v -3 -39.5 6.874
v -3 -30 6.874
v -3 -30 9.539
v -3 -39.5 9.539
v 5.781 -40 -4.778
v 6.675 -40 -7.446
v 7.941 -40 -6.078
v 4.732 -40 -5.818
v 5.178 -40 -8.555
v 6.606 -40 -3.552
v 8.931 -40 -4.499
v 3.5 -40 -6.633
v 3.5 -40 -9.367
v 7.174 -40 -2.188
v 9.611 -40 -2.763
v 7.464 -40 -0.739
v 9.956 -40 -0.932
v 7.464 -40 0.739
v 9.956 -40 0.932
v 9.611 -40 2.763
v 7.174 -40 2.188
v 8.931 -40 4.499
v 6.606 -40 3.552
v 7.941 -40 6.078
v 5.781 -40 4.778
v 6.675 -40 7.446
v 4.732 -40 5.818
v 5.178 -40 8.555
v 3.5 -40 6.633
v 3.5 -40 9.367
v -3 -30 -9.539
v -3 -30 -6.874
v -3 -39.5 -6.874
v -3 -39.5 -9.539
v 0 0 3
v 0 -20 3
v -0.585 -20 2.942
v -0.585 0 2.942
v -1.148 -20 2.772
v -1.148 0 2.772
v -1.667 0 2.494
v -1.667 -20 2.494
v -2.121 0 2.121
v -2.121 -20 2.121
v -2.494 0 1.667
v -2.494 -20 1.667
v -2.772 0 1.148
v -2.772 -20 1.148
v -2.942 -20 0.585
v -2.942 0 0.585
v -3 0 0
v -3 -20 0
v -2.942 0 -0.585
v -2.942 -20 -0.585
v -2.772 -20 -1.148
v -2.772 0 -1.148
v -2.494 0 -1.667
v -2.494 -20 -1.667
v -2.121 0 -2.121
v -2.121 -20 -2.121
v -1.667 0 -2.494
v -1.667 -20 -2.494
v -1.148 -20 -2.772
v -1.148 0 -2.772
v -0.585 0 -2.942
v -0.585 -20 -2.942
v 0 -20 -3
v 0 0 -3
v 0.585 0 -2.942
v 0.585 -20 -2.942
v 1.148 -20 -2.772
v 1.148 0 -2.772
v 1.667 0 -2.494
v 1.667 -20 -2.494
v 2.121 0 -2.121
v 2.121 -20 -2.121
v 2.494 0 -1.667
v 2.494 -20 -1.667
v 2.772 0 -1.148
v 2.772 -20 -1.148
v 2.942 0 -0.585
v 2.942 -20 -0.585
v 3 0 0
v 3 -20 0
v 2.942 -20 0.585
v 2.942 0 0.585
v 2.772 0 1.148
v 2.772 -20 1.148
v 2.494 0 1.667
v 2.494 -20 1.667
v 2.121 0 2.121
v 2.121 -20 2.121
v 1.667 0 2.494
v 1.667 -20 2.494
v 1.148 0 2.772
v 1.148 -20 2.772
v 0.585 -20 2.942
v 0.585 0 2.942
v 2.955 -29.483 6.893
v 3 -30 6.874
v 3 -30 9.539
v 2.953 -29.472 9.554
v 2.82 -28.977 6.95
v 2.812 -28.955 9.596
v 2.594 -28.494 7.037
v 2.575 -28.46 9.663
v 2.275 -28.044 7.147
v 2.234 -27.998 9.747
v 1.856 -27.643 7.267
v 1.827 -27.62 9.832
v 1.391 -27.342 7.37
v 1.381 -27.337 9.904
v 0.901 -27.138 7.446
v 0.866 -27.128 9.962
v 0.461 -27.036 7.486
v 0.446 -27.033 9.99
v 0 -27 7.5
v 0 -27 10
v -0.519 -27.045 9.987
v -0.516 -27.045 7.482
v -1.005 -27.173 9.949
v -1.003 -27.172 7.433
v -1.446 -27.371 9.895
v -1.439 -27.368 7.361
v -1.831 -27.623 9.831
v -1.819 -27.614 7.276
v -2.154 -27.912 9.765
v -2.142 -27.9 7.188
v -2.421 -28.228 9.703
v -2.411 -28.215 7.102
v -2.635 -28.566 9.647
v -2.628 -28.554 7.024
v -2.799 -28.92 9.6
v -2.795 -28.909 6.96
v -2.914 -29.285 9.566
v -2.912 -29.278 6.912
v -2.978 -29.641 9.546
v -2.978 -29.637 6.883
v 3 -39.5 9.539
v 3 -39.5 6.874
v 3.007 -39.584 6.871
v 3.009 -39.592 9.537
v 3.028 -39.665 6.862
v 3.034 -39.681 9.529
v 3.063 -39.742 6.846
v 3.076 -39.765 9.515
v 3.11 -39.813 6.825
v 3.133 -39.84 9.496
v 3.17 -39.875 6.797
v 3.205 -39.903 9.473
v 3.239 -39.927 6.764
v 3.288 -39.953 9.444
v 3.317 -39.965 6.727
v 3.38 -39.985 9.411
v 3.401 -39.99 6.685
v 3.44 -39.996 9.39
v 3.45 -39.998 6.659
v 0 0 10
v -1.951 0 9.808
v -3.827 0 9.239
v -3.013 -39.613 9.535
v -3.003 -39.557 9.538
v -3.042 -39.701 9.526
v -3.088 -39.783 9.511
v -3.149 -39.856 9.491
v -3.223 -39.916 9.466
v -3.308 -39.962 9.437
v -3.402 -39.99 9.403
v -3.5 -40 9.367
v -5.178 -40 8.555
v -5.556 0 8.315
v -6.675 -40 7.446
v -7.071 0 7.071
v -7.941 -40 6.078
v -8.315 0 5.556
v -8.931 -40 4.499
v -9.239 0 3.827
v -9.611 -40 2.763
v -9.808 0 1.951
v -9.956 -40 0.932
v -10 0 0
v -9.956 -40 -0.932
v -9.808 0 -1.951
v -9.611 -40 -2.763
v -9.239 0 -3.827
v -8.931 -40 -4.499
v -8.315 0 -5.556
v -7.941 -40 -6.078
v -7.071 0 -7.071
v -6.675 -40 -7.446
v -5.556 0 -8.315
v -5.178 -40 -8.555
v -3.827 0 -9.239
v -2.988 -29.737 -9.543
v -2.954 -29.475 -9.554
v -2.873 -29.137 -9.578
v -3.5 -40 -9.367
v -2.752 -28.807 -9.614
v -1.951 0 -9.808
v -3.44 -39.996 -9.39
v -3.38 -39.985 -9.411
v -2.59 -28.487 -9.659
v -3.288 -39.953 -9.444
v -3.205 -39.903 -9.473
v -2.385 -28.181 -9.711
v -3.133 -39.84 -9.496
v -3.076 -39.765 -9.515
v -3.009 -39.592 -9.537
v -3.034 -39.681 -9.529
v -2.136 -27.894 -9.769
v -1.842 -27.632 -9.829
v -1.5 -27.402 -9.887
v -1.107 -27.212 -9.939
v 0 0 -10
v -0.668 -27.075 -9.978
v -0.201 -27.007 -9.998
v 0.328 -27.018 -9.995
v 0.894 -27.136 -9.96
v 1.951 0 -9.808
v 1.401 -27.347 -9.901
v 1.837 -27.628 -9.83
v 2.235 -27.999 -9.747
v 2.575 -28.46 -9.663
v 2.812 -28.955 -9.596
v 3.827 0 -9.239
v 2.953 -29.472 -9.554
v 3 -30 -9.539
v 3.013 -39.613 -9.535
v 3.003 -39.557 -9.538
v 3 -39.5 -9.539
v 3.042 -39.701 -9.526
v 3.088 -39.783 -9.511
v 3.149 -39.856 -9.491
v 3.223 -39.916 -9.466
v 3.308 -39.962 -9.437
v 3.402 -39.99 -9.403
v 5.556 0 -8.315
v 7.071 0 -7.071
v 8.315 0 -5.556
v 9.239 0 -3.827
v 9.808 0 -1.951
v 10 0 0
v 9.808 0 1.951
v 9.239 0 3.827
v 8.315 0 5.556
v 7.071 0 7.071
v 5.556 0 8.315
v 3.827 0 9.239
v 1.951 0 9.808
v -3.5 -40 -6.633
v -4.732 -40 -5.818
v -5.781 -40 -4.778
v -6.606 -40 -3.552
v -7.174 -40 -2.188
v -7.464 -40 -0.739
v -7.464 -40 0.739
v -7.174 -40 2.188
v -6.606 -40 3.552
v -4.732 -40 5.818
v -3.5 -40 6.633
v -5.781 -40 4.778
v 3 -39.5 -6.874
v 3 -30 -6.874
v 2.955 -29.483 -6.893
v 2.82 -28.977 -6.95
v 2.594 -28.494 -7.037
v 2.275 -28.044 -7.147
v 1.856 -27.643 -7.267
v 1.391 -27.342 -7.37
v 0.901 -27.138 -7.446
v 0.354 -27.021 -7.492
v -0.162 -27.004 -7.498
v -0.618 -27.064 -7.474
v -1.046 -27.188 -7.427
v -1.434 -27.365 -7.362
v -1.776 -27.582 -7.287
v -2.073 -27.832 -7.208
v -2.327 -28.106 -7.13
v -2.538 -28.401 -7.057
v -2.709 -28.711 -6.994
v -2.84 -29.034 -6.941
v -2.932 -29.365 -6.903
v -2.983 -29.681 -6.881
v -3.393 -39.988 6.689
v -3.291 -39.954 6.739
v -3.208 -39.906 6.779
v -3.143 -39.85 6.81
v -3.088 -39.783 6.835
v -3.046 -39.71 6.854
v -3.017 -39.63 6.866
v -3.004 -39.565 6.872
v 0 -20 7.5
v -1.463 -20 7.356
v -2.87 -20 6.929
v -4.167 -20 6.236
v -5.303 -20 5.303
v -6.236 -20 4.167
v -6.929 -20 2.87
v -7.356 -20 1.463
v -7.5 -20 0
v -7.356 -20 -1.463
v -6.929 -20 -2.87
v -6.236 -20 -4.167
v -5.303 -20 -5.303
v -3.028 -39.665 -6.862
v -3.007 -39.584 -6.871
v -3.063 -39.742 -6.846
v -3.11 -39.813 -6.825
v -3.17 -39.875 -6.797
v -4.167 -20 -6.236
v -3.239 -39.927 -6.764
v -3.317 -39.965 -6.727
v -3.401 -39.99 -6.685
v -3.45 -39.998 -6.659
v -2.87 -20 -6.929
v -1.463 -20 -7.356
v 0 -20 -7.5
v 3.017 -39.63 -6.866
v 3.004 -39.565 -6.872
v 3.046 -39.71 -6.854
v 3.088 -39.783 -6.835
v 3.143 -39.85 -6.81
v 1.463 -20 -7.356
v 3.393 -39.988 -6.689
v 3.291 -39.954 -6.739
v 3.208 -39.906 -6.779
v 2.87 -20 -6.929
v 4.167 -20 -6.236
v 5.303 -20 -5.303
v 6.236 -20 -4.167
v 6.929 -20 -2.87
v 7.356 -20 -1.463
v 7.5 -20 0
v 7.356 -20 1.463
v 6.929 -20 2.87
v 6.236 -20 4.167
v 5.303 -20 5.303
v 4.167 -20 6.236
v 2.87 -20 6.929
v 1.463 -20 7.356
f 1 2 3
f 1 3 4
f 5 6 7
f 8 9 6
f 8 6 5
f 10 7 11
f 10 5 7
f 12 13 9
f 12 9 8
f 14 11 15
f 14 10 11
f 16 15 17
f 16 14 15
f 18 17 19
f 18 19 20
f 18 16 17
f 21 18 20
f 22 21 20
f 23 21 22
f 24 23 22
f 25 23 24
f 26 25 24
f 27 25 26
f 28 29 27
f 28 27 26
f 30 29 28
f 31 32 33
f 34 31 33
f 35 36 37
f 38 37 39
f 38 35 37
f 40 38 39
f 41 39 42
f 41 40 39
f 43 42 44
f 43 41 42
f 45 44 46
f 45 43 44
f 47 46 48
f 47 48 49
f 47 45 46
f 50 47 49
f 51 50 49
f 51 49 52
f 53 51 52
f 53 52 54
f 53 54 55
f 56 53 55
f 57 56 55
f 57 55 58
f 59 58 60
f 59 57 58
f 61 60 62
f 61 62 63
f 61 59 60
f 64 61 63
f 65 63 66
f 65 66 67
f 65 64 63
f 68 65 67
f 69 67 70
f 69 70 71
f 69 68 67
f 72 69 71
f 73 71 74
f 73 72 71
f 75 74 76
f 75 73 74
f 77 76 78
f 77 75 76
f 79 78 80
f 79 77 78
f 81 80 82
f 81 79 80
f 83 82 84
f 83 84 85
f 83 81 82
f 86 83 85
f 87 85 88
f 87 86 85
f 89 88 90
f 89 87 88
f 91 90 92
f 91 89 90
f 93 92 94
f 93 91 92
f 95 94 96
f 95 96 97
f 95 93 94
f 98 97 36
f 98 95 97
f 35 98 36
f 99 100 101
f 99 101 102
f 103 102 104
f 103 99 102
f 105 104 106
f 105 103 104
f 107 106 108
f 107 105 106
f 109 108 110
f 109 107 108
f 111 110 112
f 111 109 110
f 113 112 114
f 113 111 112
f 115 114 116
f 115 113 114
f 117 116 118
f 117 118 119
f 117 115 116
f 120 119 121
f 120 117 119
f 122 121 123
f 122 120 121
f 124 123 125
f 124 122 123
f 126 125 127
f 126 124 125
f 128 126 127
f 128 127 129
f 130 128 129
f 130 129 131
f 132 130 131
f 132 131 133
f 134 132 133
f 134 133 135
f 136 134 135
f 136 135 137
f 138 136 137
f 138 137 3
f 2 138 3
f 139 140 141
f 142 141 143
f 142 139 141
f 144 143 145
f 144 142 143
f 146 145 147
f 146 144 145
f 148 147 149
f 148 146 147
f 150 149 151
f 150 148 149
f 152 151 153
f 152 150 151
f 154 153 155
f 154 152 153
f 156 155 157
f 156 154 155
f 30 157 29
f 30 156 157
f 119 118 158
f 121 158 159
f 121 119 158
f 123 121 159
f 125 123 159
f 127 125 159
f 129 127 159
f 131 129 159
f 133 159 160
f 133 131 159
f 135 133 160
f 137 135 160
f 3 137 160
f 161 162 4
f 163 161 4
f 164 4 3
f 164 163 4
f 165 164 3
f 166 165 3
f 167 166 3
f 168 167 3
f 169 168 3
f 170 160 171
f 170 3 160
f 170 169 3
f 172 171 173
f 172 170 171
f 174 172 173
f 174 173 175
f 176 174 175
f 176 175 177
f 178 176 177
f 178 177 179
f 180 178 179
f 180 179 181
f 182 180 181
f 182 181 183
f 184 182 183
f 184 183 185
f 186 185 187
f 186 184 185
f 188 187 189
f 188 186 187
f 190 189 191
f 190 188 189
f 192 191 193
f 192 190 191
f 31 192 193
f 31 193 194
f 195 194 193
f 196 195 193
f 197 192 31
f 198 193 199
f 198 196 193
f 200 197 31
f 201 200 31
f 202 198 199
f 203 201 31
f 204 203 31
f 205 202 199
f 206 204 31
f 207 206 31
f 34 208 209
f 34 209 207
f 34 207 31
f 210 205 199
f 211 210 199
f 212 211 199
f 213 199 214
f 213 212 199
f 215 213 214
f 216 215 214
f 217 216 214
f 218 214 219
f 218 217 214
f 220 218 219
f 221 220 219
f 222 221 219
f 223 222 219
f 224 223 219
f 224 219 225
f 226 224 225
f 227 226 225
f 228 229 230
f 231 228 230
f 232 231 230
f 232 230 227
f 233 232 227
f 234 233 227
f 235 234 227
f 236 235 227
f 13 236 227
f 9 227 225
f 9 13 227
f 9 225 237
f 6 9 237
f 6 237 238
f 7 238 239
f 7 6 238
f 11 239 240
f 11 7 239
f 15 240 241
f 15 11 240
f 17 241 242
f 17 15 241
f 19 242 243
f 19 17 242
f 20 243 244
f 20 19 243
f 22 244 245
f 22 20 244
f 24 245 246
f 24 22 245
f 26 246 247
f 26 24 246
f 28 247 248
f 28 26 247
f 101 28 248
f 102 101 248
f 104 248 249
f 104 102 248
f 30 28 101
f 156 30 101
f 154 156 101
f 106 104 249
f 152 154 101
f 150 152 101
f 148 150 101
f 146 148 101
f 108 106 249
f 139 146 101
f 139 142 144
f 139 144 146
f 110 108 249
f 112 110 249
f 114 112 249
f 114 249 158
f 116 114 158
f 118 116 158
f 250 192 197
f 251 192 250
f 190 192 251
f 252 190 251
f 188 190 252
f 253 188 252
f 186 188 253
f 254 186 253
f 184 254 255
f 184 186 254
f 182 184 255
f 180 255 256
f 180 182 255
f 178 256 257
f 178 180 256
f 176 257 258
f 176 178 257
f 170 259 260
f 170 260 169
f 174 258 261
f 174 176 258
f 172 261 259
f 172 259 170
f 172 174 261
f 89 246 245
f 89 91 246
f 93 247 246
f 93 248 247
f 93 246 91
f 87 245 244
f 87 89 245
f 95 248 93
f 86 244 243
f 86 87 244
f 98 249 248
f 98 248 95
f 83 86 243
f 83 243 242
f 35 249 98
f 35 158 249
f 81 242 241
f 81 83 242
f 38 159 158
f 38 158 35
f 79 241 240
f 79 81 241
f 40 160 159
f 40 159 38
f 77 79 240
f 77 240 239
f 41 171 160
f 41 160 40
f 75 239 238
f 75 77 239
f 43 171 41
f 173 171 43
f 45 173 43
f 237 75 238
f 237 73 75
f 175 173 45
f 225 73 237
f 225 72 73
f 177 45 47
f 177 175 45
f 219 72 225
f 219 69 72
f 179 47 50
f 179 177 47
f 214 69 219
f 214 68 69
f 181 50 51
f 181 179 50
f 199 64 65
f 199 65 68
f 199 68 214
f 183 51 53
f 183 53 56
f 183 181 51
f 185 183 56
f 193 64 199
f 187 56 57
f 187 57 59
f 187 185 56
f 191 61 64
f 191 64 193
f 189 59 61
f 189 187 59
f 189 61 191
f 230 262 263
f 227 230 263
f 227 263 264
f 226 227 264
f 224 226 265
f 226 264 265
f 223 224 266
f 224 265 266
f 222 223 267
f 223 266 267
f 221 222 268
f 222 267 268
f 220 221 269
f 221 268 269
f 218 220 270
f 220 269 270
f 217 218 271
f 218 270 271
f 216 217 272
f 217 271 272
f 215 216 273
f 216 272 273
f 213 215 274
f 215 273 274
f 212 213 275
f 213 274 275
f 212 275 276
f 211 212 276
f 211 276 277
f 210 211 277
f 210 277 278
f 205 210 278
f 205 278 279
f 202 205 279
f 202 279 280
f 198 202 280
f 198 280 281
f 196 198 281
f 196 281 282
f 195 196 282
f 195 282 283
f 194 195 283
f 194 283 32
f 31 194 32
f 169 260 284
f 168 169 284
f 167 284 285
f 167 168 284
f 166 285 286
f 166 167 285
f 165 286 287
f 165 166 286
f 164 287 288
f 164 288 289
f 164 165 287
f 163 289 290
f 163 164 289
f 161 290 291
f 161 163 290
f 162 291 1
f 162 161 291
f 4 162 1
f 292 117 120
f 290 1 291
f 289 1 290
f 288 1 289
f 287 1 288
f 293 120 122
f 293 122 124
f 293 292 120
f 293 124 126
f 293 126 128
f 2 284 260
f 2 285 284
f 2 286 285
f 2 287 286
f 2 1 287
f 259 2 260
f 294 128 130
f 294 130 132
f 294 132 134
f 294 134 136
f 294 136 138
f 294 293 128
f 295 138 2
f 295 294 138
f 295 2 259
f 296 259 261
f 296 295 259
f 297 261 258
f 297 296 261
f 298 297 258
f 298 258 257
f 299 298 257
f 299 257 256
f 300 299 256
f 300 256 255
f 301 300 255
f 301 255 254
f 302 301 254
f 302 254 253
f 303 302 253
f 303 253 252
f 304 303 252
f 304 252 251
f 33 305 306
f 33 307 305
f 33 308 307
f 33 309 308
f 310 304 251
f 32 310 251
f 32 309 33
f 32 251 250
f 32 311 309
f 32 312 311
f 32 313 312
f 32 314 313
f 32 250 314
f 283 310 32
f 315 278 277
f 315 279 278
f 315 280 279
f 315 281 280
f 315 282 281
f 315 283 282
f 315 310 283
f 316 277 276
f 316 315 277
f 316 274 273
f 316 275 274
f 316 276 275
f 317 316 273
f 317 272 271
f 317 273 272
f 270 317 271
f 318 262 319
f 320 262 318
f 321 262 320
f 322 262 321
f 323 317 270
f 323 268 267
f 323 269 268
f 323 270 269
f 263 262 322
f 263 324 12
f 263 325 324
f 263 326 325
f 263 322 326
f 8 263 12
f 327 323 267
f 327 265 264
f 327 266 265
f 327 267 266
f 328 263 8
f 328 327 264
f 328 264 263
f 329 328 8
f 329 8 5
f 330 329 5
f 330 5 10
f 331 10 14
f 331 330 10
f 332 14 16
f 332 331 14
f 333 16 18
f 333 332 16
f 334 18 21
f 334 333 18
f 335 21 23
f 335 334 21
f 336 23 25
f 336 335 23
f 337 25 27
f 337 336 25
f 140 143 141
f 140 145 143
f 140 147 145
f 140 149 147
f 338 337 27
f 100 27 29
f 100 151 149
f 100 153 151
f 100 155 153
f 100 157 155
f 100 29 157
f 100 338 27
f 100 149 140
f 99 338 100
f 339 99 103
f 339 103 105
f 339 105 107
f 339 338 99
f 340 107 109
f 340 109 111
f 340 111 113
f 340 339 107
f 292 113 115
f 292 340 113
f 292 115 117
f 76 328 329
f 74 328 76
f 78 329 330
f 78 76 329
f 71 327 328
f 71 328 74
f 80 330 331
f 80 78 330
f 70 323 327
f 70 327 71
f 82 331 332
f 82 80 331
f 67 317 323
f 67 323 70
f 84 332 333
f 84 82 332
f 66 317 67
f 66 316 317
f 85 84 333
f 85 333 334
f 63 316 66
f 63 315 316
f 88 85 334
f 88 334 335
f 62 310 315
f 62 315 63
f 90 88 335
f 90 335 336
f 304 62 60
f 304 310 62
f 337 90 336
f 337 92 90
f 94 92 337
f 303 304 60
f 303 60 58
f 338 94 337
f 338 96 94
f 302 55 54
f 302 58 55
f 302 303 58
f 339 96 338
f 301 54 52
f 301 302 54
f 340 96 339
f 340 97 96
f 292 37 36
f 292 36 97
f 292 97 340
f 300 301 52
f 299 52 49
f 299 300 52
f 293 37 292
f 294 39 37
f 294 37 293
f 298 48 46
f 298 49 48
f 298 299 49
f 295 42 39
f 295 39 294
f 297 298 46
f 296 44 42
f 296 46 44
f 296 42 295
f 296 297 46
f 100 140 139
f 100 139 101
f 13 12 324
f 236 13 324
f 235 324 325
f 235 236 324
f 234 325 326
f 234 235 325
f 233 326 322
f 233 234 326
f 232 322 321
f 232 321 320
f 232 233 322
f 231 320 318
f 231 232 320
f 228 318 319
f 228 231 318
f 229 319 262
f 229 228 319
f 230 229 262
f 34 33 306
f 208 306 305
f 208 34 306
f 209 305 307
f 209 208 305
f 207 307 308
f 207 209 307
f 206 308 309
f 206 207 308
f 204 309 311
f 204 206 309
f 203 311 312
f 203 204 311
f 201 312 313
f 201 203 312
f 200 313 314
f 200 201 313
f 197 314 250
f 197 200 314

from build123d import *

# Parameters (mm, degrees)
F3_DEPTH      = 10.001
F3_DEPTH_BACK = 10.001
F4_R          = 0.5


with BuildPart() as f1:
    # F0 (on Right) → F1 (revolve)
    with BuildSketch(Plane.YZ):
        Polygon((-20, 3), (0, 3), (0, 10), (-40, 10), (-40, 7.5), (-20, 7.5), align=None)
    revolve(axis=Axis((0, -10.6568620467, 0), (0, -1, 0)))

    # F2 (on Top) → F3 (cut, two sides)
    with BuildSketch(Plane.XY) as f3_sk:
        with BuildLine():
            Line((-3, -30), (-3, -40))
            Line((-3, -40), (3, -40))
            Line((3, -40), (3, -30))
            ThreePointArc((3, -30), (0, -27), (-3, -30))
        make_face()
    extrude(amount=-F3_DEPTH, mode=Mode.SUBTRACT)
    extrude(f3_sk.sketch, amount=F3_DEPTH_BACK, mode=Mode.SUBTRACT)

    # F4
    f4_edges = [f1.edges().sort_by_distance(p)[0] for p in [
        (-3, -40, 8.206628),
        (-3, -40, -8.206628),
        (3, -40, 8.206628),
        (3, -40, -8.206628),
    ]]
    fillet(f4_edges, radius=F4_R)


solid = f1.part
